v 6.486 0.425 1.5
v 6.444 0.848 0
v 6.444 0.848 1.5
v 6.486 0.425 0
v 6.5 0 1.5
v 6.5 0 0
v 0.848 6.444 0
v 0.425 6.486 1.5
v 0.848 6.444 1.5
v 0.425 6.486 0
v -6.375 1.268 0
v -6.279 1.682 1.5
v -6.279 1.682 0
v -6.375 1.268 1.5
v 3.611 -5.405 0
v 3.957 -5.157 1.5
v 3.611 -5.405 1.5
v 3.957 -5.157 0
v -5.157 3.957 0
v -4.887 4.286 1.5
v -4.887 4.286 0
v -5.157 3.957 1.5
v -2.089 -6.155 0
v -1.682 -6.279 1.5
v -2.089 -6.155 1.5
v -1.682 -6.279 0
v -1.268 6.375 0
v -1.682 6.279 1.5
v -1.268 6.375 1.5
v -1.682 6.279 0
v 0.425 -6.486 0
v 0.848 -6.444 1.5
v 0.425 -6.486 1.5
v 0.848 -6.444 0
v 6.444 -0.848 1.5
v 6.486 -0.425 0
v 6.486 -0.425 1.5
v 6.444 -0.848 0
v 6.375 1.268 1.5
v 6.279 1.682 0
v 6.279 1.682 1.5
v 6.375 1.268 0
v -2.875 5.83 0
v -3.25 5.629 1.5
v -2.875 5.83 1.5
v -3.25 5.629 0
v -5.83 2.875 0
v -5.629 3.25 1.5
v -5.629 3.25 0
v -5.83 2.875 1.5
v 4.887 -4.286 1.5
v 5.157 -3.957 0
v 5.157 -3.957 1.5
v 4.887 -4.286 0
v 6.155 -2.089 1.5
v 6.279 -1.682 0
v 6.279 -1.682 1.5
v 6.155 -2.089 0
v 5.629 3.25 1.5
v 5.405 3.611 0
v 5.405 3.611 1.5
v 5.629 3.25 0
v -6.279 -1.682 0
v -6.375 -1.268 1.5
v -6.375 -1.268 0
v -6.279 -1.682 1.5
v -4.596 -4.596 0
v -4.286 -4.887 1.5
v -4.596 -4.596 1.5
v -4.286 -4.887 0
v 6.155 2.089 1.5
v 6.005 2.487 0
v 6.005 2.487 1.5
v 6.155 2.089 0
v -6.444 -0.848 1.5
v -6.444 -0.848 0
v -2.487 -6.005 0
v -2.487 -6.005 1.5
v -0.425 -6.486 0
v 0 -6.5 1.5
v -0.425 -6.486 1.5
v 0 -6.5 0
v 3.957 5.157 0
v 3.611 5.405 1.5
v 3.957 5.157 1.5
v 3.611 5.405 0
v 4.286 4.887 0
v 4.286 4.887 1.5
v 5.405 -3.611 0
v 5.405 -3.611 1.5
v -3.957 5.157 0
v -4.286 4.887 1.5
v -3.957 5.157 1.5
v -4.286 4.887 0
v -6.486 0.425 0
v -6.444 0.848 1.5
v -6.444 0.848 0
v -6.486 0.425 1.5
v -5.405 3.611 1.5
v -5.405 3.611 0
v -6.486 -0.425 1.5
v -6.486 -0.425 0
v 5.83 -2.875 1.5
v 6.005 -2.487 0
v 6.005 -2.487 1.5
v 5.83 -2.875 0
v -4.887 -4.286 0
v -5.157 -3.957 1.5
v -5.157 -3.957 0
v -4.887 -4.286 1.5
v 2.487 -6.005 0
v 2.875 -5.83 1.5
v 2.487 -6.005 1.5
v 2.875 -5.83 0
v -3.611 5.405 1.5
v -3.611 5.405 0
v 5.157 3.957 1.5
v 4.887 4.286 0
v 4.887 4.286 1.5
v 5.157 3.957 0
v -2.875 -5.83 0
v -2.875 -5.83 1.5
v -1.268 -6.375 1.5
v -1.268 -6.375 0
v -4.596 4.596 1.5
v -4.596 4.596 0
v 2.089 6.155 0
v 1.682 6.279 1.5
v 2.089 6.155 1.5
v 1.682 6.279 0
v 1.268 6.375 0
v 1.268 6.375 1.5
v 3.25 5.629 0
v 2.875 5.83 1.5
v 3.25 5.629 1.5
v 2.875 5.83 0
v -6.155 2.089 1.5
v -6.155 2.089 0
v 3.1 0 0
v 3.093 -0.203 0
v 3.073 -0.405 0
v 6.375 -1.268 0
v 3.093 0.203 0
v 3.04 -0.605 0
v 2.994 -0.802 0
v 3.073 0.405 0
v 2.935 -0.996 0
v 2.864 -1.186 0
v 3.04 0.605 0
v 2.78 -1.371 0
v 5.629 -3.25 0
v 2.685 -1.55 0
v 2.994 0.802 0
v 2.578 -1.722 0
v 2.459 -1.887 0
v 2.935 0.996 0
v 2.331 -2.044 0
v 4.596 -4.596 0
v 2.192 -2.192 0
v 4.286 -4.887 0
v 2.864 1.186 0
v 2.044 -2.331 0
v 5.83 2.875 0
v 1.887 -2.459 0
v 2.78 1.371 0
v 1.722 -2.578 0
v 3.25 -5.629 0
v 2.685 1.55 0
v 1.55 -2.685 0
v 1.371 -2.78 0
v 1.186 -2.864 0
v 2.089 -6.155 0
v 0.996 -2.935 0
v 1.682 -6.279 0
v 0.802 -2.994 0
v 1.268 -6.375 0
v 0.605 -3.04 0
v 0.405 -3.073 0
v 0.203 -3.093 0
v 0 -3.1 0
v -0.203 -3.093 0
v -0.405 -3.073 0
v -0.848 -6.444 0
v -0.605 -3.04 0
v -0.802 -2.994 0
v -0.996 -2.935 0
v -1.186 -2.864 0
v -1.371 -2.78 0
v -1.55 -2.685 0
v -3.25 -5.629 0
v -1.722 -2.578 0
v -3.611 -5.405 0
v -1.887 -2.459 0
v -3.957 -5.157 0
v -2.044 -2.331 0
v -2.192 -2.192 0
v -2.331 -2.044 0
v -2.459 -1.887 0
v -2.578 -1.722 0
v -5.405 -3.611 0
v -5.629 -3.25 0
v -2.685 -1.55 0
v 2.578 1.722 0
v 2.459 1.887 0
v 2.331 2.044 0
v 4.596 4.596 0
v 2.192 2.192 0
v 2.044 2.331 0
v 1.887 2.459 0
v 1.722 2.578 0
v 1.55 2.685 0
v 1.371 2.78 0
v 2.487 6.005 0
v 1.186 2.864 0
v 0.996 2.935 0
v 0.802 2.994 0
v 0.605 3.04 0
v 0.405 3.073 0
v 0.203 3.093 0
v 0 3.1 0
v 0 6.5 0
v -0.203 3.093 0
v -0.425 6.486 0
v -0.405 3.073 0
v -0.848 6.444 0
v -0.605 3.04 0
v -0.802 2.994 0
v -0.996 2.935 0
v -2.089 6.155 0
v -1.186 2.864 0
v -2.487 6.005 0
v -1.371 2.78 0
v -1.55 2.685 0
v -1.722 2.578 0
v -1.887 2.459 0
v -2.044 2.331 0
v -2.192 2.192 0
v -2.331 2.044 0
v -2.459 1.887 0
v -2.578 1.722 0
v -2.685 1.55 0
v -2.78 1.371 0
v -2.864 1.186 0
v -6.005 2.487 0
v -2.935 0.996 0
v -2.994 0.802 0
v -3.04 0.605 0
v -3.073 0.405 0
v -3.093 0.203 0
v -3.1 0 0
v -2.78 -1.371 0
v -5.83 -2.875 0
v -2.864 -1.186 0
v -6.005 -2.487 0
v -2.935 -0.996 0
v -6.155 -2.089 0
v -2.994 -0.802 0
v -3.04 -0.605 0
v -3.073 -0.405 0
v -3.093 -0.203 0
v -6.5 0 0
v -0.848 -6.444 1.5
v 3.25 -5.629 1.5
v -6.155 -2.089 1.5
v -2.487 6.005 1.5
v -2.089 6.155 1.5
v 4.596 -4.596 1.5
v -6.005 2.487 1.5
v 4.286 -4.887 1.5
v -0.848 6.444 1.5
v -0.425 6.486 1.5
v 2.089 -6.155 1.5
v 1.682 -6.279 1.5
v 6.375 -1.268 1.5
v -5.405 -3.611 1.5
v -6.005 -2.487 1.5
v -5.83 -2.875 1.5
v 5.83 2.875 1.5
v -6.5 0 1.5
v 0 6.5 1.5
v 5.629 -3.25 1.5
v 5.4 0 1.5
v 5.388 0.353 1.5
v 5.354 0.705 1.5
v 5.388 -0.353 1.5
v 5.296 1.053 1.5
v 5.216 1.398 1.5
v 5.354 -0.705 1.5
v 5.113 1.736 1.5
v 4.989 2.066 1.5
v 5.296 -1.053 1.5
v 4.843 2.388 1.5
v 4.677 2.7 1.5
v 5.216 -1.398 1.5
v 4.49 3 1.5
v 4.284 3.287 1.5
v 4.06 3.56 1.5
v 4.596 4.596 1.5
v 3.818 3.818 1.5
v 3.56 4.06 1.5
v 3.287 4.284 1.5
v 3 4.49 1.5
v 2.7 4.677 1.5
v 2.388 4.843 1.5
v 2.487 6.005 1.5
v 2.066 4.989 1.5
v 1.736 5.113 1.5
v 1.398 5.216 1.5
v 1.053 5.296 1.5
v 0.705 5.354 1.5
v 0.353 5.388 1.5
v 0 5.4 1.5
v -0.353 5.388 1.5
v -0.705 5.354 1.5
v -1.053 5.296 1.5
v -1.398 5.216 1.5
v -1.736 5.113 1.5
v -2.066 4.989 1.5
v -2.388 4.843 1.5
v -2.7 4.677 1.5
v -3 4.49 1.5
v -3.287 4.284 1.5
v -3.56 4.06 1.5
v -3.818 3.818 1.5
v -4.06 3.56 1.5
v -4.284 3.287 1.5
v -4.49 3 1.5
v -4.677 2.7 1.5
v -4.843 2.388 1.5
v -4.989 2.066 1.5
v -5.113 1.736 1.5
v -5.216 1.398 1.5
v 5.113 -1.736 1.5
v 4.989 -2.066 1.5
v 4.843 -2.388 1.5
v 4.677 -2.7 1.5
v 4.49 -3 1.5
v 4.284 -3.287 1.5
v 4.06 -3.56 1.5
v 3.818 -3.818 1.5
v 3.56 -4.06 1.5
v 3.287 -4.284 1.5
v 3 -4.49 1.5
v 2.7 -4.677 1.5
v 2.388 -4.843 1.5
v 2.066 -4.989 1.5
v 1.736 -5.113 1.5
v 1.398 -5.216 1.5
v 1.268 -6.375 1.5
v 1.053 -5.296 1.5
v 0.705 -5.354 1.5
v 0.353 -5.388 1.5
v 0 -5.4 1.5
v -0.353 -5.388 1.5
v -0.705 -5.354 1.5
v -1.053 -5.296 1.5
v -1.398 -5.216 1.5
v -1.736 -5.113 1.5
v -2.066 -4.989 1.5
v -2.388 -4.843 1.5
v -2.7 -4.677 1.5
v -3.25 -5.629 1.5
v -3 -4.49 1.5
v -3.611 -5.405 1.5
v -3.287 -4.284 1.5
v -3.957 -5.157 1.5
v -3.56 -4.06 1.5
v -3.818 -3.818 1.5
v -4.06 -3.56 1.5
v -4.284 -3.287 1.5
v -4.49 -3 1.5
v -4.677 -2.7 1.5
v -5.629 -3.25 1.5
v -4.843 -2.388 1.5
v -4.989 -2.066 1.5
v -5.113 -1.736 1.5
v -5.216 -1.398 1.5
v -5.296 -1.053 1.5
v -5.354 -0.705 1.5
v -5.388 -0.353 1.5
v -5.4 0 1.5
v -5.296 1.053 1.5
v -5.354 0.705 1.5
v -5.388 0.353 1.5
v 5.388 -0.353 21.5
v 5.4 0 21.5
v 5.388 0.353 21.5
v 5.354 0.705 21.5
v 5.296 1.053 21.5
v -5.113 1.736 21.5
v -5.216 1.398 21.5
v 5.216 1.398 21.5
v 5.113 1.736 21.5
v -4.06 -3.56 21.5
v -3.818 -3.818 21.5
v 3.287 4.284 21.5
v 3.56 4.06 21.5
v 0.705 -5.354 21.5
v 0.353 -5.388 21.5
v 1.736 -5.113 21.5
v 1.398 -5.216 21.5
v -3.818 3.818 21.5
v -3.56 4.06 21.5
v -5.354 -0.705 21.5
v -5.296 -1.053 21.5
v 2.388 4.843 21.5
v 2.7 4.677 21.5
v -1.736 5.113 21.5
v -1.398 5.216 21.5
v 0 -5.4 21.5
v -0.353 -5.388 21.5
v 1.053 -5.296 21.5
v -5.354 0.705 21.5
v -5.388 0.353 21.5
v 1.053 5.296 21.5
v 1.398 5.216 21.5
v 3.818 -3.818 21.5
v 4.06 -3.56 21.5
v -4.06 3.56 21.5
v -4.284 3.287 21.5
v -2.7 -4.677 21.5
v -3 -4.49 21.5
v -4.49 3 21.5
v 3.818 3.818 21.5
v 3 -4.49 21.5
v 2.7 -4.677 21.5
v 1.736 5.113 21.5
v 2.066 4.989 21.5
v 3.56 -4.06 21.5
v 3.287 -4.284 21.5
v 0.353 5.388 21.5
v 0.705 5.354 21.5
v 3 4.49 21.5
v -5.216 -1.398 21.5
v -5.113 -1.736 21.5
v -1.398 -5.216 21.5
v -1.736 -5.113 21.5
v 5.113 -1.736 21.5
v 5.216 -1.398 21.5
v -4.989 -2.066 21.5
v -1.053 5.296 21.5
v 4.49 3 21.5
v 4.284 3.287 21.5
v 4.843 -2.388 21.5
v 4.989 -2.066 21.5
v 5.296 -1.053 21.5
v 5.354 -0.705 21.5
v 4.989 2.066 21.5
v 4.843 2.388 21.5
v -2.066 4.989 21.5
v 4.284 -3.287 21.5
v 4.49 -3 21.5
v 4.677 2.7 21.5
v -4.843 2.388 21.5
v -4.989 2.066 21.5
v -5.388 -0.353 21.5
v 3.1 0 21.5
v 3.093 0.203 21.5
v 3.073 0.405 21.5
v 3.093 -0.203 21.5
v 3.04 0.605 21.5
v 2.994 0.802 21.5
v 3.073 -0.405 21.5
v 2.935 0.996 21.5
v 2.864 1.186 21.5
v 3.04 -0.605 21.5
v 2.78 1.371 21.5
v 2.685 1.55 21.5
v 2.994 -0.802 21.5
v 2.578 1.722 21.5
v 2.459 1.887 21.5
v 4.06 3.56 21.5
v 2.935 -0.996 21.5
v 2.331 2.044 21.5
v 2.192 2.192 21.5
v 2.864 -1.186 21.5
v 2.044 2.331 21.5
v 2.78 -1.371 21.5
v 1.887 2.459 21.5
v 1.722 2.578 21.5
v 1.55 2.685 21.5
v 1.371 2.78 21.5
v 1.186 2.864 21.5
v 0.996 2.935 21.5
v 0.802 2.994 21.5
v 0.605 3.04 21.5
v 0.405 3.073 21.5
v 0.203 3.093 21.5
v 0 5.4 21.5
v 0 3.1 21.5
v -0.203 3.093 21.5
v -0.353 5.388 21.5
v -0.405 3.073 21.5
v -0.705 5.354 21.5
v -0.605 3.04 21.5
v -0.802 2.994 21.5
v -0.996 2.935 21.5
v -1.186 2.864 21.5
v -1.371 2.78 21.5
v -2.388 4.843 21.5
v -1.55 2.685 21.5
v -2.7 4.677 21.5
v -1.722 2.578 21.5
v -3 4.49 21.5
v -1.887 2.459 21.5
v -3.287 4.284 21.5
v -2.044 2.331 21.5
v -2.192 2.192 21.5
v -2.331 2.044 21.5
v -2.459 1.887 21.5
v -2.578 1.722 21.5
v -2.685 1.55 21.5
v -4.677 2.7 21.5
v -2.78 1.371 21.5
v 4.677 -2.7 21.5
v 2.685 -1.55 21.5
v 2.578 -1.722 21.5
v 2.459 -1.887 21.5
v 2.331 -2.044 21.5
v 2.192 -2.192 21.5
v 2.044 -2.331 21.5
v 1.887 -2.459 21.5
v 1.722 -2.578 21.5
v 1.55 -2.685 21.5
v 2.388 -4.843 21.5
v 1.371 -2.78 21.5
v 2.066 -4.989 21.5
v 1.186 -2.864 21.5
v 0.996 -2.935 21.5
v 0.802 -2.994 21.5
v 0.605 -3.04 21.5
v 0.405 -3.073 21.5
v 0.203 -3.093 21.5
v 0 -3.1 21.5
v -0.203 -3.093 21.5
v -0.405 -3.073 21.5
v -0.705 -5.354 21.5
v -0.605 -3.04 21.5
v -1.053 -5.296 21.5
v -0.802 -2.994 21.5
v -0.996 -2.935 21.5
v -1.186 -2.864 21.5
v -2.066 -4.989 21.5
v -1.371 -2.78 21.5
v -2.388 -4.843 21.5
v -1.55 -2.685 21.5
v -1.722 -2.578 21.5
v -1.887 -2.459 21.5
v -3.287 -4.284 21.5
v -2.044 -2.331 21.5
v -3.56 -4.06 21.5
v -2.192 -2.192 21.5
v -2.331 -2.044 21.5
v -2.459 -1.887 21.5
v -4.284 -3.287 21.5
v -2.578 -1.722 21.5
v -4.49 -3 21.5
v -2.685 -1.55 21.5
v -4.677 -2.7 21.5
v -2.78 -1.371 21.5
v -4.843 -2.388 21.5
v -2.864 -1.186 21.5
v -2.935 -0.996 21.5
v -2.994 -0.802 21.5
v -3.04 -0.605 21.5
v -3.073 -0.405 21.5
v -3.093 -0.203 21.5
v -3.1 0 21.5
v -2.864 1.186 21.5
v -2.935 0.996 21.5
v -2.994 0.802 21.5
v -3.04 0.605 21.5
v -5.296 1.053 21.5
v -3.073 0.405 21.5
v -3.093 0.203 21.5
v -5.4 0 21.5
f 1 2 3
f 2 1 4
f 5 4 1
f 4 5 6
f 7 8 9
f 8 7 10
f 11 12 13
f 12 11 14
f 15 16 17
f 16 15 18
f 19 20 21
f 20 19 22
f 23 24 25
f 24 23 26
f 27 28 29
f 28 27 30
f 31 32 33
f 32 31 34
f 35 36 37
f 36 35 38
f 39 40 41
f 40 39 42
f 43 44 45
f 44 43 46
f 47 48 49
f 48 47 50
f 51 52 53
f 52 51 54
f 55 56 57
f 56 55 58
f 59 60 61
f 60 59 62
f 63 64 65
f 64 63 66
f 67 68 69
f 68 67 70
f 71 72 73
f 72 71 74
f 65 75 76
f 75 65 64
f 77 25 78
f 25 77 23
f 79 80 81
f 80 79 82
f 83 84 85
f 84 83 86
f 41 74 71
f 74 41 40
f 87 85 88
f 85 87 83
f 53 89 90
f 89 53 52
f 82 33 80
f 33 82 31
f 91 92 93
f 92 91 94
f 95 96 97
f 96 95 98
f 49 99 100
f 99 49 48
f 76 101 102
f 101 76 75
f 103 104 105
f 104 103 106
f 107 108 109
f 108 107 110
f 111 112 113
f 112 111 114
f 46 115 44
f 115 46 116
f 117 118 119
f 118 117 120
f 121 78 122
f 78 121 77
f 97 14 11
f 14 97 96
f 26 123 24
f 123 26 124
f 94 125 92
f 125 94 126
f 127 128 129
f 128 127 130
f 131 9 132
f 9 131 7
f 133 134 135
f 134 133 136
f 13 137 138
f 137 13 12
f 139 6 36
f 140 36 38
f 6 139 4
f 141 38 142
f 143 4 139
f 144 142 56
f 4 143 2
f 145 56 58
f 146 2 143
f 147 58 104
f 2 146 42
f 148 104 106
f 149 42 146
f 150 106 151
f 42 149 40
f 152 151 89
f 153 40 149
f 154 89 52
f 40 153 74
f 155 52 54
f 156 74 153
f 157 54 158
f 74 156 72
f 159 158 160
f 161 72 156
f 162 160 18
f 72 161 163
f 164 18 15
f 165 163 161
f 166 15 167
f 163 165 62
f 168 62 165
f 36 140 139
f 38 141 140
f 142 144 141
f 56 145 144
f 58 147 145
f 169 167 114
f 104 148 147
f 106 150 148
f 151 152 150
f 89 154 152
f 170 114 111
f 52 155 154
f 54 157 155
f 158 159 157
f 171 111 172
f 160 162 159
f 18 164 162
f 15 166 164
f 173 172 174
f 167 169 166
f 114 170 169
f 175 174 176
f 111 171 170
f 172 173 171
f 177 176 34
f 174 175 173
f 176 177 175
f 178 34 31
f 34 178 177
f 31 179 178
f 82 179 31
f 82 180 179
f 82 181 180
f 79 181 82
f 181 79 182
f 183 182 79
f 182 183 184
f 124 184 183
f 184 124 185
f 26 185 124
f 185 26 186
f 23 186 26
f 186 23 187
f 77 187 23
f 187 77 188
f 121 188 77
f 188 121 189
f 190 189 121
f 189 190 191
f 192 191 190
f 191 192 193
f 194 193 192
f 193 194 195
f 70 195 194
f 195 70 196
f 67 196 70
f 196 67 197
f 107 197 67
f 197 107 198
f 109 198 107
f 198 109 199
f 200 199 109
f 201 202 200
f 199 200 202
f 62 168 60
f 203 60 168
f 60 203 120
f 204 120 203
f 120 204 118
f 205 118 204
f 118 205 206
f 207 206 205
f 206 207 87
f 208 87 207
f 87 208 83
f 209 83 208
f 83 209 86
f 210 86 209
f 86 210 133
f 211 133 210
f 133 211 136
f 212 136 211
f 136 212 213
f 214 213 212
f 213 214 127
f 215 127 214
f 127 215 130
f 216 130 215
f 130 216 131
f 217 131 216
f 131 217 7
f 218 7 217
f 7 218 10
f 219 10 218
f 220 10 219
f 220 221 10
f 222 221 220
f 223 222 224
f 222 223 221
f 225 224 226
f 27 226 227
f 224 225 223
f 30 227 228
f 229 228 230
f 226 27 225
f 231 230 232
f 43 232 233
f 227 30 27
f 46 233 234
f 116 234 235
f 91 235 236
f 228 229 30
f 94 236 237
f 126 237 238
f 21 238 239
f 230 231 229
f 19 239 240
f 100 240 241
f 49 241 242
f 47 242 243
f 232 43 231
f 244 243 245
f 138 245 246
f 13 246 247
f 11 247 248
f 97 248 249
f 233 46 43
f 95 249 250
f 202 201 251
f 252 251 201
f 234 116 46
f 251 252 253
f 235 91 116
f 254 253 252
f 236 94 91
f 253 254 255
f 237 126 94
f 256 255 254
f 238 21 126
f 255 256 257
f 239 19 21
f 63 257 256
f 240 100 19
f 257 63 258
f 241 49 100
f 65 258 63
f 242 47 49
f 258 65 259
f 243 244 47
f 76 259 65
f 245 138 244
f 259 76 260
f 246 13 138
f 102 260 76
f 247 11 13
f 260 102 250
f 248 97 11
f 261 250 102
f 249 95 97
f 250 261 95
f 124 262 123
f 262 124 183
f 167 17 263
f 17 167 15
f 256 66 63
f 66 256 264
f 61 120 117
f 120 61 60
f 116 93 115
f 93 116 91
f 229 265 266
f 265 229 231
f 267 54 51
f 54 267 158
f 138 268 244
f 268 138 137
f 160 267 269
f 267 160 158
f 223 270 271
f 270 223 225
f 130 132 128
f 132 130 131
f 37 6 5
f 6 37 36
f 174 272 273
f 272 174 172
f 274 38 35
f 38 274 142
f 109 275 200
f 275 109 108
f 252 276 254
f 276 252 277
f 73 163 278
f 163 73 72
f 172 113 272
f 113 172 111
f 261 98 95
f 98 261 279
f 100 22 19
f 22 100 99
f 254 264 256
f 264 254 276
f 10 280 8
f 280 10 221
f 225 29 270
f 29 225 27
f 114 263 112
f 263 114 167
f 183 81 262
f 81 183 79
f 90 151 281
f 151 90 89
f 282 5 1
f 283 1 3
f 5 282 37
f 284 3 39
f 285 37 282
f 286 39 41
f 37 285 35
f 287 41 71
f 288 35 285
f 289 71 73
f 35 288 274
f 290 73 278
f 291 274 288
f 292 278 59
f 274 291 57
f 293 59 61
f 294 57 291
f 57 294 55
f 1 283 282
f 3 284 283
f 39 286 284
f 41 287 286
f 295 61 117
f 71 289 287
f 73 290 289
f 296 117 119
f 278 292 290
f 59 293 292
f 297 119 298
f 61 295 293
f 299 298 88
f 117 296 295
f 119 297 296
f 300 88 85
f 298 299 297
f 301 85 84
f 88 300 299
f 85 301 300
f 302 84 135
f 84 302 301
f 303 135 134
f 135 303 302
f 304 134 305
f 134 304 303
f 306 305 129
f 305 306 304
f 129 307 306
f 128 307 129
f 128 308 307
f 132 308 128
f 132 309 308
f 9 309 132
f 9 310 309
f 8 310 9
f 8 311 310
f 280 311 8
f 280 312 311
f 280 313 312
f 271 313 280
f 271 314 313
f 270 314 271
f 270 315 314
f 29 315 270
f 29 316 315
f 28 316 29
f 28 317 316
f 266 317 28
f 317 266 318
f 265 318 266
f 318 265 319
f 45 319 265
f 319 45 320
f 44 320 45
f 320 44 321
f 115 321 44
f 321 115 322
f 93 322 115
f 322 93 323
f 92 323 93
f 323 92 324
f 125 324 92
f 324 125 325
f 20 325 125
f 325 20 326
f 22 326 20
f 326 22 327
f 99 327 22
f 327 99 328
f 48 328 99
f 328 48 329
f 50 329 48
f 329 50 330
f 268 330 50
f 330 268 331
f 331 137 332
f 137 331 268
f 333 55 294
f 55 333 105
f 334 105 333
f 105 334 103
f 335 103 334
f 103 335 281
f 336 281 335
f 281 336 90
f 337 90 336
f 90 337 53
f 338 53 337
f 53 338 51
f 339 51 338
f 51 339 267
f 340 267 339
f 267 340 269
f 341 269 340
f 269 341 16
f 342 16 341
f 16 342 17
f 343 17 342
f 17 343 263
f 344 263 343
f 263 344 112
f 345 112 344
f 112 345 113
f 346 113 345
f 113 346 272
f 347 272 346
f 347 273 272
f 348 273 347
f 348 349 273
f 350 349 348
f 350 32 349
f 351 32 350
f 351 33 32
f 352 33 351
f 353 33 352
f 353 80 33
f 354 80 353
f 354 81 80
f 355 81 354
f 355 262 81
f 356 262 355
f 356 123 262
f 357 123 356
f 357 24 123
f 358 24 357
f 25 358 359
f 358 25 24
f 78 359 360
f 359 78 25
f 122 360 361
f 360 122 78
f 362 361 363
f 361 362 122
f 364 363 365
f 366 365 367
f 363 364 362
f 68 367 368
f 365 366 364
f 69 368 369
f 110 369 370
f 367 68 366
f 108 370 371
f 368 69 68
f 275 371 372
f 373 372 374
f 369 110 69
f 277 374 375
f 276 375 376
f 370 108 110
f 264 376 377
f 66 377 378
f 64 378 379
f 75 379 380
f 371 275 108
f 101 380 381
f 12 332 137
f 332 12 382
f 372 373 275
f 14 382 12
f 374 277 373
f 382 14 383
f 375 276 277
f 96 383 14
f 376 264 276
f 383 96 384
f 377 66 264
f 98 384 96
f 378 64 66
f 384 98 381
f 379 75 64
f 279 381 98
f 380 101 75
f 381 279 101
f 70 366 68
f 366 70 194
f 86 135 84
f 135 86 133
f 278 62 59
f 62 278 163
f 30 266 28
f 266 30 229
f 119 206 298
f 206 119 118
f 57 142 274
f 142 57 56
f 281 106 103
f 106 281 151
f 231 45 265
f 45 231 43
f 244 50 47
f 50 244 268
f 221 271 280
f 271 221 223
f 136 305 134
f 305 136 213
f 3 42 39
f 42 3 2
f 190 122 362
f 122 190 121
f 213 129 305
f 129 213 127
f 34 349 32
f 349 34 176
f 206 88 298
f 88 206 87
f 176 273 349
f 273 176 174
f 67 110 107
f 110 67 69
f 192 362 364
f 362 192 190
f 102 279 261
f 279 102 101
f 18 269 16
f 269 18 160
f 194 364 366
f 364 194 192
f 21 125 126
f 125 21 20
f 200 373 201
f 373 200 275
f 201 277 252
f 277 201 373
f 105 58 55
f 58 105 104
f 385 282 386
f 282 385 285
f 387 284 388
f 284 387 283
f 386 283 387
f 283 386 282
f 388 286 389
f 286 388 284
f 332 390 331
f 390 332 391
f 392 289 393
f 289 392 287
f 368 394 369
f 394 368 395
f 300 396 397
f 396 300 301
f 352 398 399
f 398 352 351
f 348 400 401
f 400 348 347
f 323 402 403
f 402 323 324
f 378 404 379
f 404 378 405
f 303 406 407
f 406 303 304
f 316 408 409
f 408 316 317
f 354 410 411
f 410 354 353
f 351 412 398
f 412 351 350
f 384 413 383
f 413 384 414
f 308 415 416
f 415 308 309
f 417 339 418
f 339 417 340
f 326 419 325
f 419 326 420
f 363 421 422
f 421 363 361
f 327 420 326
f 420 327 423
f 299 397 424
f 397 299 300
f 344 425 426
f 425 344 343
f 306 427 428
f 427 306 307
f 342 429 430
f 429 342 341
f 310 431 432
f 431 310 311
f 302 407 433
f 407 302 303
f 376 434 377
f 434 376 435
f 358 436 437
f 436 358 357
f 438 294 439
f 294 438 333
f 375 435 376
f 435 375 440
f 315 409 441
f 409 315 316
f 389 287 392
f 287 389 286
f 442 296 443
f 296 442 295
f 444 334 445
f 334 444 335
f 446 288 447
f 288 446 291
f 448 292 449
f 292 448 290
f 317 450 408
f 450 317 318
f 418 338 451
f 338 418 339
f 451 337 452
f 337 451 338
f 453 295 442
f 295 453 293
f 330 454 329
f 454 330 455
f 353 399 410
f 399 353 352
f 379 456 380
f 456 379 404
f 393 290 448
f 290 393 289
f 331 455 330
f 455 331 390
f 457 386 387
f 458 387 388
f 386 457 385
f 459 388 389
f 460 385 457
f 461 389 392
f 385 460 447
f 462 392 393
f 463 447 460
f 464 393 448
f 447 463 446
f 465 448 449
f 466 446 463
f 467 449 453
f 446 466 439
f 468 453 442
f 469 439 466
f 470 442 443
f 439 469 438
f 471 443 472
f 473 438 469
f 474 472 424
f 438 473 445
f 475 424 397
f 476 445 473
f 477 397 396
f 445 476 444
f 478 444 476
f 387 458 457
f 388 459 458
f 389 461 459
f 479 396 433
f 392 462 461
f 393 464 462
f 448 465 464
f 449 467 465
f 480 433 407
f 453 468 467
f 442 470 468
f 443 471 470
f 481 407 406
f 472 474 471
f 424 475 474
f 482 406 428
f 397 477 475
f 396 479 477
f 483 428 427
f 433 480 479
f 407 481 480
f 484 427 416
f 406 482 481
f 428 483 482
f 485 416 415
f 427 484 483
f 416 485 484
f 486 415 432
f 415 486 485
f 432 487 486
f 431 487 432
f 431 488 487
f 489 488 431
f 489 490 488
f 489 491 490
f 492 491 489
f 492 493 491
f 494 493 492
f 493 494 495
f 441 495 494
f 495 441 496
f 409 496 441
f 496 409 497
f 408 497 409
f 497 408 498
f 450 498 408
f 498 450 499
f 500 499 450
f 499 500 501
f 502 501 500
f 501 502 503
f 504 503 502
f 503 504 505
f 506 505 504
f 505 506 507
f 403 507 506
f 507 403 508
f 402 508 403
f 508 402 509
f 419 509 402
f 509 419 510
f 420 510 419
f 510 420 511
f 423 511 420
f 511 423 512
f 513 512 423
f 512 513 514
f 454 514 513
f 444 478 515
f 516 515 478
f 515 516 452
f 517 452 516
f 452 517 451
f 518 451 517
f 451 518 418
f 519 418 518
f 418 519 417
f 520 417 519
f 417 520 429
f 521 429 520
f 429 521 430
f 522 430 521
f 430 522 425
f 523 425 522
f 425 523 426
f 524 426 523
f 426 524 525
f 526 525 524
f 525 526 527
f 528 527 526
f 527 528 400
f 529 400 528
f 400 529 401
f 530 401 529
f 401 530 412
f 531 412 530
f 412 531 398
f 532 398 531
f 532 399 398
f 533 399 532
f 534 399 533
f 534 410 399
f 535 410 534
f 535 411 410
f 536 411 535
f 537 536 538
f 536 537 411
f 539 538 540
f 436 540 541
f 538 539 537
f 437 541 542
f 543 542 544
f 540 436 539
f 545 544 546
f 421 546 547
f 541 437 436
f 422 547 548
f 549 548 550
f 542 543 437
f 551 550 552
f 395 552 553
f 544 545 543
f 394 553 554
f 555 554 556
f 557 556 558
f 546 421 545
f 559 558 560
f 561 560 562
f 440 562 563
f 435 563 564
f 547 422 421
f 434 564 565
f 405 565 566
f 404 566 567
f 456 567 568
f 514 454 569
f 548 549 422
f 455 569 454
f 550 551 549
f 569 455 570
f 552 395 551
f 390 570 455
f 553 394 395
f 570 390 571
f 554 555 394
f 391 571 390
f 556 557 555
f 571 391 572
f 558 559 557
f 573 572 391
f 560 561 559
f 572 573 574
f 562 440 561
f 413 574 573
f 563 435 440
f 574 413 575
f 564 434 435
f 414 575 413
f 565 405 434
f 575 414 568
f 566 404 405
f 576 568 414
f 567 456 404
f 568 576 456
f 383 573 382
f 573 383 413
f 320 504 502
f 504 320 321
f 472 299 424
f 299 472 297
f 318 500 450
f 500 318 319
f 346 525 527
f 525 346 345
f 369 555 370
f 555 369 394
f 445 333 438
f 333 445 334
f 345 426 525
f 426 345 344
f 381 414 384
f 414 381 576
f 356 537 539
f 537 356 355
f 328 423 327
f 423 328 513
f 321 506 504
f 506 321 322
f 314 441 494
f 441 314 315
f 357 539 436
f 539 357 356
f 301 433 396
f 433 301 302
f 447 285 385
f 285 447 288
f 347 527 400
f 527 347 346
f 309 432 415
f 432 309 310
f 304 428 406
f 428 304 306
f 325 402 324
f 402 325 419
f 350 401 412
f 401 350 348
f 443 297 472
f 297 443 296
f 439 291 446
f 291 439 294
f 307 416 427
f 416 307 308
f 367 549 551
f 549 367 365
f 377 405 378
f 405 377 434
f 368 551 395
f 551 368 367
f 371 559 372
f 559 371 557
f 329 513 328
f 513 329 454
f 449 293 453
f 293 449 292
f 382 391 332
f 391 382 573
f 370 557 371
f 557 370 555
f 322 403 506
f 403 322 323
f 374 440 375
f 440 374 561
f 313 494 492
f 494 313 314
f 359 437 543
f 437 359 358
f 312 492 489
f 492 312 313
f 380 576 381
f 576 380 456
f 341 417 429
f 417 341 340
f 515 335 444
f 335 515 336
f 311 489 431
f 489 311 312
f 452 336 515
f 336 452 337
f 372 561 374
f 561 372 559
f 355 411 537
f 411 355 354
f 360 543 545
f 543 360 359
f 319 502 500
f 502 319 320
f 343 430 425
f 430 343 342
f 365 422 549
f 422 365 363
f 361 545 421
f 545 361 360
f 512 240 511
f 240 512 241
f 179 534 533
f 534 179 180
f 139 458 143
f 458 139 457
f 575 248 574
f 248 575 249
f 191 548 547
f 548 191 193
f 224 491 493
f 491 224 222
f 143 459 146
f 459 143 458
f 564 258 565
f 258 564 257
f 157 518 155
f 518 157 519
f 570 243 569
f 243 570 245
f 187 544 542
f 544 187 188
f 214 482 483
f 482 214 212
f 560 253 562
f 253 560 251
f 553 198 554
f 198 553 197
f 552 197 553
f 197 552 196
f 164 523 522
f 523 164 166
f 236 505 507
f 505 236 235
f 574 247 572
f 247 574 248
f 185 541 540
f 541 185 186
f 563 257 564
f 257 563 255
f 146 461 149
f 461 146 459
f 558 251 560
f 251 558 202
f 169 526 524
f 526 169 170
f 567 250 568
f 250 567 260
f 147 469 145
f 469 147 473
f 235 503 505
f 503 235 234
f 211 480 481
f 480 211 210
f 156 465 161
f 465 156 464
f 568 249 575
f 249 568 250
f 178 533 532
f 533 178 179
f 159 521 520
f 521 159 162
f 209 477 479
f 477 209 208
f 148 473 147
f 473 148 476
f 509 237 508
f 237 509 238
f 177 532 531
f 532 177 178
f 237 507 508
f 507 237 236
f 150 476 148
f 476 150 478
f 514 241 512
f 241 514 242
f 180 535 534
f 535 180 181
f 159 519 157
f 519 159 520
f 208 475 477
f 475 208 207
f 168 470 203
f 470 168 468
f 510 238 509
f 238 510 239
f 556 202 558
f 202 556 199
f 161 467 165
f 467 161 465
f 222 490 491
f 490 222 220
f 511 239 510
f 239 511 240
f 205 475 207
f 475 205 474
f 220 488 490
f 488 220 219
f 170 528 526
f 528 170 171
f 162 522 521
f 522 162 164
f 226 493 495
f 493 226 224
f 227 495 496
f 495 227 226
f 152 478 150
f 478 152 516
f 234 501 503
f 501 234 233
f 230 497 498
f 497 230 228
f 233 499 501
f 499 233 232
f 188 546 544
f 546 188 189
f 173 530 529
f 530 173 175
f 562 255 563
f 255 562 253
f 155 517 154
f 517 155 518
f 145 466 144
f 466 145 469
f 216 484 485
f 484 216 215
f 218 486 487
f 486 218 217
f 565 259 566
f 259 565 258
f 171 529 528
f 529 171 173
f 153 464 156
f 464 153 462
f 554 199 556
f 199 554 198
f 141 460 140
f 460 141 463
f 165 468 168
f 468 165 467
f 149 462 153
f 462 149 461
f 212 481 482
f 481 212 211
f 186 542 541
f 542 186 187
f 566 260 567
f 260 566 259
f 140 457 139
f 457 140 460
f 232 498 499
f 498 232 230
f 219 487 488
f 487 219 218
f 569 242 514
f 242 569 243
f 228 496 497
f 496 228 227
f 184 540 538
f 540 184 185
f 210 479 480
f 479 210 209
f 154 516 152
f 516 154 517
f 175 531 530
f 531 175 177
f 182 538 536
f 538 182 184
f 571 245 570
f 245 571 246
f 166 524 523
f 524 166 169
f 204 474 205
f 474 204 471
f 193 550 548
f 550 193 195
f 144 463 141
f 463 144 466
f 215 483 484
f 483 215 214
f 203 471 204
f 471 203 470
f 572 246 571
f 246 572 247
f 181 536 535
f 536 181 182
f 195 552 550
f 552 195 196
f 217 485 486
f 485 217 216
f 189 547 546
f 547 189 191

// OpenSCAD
// PCR tube adapter sleeve - prints upside down: collar on bed (z=0..1.5),
// sleeve body rises to z=21.5, full-height 6.2 mm bore open at both ends.
// Units: mm. No external libraries.

// ---------------- Parameters ----------------
collar_d        = 13;    // collar outer diameter
collar_t        = 1.5;   // collar thickness (z = 0 to 1.5)
sleeve_d        = 10.8;  // sleeve body outer diameter
sleeve_top_z    = 21.5;  // sleeve body top height (z)
bore_d          = 6.2;   // through-bore diameter
eps             = 0.5;   // cutter overshoot past faces

$fn = 96;

// ---------------- Model ----------------
difference() {
    union() {
        // Collar: cylinder, z = 0 to 1.5
        cylinder(d = collar_d, h = collar_t);

        // Sleeve body: cylinder, z = 1.5 to 21.5 (slight overlap into collar)
        translate([0, 0, collar_t - 0.01])
            cylinder(d = sleeve_d, h = sleeve_top_z - collar_t + 0.01);
    }

    // Through-bore: extends past both end faces
    translate([0, 0, -eps])
        cylinder(d = bore_d, h = sleeve_top_z + 2 * eps);
}
